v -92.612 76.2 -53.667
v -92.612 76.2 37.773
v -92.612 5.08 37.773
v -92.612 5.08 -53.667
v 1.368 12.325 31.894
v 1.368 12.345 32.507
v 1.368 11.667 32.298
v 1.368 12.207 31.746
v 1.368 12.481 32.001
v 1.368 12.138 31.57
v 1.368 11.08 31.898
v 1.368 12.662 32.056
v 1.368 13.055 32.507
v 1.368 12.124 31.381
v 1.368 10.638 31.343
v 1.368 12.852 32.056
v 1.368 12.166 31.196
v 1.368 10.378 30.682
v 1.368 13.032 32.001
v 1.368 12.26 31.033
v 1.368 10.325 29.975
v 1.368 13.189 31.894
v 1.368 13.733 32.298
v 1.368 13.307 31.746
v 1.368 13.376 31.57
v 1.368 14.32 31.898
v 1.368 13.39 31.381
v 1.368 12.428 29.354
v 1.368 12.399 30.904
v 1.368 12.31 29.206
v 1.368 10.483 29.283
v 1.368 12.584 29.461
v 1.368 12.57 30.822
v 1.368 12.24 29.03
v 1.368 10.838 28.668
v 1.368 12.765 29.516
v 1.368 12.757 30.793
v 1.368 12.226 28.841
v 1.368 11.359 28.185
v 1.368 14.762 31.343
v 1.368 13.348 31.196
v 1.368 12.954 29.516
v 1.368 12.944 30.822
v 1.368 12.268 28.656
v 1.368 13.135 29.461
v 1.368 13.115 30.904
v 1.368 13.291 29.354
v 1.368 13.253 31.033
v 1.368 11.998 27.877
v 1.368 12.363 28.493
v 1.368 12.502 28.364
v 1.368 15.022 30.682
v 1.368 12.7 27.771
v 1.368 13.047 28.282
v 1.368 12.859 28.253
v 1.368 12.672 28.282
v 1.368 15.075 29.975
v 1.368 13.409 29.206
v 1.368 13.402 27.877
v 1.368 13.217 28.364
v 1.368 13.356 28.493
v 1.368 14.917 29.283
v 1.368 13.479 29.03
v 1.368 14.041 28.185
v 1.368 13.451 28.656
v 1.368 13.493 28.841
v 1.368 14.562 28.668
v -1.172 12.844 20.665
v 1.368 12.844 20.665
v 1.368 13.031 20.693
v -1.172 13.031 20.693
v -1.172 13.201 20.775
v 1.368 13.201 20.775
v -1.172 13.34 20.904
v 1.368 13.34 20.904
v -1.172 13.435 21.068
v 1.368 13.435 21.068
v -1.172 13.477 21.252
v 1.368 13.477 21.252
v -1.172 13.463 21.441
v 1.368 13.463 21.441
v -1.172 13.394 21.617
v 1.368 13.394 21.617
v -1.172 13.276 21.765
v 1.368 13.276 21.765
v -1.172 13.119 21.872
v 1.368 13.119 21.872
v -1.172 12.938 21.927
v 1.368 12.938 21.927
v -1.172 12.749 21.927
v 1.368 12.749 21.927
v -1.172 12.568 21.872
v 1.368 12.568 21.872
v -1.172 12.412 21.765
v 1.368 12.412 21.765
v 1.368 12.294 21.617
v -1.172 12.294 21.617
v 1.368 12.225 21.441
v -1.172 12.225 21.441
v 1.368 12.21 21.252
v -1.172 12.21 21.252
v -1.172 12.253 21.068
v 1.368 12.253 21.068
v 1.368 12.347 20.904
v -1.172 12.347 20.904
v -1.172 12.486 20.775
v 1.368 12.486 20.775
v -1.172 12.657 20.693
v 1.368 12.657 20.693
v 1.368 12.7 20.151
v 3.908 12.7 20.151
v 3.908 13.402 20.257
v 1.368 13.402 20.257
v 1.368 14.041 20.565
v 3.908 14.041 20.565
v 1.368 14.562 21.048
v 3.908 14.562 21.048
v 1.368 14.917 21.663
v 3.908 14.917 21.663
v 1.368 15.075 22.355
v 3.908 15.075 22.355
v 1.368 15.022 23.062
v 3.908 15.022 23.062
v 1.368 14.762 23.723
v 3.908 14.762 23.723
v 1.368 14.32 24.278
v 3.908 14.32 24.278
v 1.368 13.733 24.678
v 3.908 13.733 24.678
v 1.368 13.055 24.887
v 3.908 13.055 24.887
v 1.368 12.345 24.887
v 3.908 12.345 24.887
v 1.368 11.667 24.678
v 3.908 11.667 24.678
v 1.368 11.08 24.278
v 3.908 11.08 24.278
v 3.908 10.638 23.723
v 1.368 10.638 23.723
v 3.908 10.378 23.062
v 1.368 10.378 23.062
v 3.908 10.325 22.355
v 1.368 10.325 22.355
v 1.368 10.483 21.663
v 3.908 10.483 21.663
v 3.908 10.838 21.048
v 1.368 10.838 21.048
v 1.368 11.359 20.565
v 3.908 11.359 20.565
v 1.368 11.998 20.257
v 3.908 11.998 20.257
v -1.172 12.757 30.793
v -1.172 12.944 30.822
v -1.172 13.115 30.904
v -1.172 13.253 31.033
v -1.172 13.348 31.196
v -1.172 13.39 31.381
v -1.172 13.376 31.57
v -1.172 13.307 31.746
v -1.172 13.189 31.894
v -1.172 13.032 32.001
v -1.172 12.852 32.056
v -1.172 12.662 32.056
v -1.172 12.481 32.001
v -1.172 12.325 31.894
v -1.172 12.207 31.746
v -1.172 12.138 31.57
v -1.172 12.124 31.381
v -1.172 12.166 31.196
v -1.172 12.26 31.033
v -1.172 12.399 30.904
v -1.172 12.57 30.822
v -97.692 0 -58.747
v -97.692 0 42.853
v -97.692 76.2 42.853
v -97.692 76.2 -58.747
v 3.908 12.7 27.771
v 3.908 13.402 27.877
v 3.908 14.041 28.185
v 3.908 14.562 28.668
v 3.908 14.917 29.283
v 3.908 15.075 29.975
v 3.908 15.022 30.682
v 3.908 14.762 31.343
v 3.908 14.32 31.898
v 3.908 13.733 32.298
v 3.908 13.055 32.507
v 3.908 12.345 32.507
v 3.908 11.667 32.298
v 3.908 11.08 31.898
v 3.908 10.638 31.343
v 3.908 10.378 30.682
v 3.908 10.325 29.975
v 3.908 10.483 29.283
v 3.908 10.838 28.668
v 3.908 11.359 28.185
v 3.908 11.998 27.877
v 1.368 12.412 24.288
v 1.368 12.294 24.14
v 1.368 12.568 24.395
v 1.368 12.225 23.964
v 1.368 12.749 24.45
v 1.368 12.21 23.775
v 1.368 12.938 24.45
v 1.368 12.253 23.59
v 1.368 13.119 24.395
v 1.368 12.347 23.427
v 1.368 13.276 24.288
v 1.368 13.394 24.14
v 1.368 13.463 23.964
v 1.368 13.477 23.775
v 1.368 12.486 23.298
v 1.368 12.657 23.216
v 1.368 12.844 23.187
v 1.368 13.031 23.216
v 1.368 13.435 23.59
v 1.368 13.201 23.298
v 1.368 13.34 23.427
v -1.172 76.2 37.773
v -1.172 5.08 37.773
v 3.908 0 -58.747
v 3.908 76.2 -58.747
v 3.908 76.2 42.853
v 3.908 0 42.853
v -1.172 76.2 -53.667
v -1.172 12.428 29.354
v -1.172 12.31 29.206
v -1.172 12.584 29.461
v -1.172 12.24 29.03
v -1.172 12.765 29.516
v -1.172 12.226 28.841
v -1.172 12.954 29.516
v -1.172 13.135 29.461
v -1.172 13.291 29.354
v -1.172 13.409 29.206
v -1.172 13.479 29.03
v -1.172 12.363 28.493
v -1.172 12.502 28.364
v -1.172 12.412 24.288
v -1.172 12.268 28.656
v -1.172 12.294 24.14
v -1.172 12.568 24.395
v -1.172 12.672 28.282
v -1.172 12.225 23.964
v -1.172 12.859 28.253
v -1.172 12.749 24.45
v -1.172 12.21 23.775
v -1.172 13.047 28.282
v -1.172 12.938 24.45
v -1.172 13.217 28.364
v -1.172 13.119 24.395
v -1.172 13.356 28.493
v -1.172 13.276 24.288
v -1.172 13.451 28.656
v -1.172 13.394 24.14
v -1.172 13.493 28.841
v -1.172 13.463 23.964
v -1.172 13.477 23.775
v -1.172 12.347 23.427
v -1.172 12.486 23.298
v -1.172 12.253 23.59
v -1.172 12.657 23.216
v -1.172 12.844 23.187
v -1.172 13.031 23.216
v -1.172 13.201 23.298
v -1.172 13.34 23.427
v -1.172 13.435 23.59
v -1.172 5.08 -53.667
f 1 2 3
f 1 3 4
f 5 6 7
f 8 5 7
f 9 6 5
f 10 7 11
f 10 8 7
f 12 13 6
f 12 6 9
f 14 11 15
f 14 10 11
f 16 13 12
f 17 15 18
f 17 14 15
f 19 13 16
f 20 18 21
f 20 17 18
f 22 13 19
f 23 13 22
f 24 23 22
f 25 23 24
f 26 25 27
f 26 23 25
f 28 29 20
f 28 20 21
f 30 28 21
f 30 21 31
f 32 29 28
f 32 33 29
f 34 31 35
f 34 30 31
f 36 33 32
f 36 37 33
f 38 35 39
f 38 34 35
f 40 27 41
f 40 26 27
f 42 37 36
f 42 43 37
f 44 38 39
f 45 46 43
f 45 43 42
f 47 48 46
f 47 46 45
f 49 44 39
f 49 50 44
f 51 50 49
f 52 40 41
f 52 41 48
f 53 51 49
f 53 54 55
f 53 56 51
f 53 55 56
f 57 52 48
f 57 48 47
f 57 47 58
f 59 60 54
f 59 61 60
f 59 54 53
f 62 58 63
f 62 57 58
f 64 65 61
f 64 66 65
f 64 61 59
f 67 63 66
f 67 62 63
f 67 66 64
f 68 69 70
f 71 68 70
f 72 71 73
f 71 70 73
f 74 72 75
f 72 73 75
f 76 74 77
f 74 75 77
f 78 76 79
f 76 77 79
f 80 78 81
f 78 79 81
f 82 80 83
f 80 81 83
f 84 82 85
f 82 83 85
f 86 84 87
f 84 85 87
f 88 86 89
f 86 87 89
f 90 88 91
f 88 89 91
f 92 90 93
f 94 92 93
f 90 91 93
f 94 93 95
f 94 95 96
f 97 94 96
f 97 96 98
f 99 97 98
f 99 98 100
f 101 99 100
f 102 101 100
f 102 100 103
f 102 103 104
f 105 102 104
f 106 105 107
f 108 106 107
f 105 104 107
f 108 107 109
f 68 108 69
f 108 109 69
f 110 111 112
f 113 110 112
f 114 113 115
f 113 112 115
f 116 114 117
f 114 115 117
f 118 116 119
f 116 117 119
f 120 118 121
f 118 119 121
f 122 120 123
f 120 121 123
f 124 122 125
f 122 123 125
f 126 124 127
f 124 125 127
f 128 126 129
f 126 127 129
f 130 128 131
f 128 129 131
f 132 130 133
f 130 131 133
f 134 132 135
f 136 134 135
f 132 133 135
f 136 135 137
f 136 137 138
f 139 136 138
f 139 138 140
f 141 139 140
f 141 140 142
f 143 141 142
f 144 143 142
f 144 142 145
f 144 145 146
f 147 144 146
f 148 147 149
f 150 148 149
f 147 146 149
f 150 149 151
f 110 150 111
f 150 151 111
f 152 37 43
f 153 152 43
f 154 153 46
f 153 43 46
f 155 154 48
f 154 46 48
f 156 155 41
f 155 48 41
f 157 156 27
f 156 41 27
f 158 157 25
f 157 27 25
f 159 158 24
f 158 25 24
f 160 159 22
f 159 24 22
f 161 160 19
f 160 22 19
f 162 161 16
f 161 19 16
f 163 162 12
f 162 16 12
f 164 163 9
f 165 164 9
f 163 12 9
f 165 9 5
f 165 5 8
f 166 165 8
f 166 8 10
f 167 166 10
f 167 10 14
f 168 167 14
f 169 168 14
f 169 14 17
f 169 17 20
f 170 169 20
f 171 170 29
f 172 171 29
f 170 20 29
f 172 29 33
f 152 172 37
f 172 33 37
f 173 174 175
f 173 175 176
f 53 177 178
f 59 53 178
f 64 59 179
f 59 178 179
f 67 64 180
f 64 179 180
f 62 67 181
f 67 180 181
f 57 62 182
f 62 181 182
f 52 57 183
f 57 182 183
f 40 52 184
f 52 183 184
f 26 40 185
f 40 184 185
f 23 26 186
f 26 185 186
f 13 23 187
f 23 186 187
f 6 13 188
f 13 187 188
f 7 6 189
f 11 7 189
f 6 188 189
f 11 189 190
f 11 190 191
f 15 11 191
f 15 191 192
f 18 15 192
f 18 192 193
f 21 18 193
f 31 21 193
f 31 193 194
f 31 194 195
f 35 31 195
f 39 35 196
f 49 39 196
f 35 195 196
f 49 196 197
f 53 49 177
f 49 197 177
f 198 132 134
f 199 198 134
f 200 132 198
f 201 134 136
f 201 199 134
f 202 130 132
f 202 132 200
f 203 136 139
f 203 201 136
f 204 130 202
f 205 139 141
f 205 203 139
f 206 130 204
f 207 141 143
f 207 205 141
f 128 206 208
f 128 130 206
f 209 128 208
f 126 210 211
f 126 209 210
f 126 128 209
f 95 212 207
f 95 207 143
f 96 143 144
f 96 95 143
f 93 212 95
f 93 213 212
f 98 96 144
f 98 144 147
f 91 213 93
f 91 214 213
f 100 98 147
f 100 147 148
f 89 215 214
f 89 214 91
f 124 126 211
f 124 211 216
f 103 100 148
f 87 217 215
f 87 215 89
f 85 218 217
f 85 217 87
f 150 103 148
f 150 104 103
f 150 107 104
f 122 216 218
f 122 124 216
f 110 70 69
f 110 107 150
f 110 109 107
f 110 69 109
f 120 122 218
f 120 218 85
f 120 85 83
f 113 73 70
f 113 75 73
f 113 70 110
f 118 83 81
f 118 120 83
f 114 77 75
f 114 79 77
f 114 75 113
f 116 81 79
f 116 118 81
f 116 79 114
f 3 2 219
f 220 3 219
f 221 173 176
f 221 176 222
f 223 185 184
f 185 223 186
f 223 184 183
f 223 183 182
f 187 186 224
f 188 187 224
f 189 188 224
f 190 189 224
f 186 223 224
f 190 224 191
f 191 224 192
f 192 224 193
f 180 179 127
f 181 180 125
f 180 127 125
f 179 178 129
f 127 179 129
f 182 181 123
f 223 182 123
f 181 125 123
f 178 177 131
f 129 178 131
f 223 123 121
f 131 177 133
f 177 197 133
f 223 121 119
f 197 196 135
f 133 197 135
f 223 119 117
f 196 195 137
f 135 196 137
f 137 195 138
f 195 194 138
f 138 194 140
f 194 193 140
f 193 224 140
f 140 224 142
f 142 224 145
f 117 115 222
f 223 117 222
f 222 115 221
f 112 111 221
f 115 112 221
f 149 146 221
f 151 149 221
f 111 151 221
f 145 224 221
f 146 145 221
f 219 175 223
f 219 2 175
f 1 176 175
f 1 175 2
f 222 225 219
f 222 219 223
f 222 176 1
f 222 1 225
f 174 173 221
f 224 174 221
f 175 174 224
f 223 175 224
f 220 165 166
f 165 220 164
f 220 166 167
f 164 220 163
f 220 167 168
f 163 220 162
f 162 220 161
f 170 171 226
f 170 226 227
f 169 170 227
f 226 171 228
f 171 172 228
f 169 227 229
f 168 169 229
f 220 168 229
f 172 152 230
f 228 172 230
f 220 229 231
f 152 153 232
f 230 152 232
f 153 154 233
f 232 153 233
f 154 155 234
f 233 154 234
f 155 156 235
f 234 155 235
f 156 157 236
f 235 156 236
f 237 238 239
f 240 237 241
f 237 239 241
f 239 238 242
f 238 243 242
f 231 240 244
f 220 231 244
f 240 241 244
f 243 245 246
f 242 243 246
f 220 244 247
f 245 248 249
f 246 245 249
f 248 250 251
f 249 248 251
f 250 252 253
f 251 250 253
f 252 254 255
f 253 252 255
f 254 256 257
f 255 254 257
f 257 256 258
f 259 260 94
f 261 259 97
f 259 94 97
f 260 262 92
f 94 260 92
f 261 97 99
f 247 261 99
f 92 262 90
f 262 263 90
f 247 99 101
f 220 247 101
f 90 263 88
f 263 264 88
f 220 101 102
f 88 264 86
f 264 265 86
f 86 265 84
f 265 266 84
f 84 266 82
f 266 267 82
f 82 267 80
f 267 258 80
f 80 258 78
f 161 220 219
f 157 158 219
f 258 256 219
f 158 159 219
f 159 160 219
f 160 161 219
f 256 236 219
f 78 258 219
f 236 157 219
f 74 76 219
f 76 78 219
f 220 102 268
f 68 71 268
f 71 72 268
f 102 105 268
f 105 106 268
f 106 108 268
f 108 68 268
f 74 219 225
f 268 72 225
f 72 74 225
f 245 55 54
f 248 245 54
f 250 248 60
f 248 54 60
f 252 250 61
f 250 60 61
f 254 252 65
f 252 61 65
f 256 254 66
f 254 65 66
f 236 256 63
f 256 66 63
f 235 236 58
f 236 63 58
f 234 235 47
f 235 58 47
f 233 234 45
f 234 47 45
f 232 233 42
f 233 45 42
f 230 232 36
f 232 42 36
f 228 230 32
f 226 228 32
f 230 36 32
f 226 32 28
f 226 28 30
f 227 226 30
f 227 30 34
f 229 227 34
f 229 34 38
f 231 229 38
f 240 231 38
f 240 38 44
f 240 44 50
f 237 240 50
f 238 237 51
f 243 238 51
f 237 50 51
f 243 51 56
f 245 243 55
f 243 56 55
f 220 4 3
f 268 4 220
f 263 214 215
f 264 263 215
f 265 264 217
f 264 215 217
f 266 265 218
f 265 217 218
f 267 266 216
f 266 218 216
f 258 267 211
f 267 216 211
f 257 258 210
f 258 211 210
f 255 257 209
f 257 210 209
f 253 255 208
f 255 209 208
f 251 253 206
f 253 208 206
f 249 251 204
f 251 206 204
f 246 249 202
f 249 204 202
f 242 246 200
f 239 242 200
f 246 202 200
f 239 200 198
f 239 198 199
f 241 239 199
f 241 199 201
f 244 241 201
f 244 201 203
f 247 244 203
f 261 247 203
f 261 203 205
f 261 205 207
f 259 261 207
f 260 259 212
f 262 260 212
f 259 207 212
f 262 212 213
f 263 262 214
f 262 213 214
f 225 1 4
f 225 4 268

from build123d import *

# Parameters (mm, degrees)
SKETCH1_W           = 101.6
SKETCH1_H           = 101.6
BOSS_EXTRUDE1_DEPTH = 76.2
SKETCH2_W           = 91.44
SKETCH2_H           = 91.44
CUT_EXTRUDE1_DEPTH  = 71.12
SKETCH3_R           = 2.38125
CUT_EXTRUDE2_DEPTH  = 2.54
SKETCH4_R           = 0.635
CUT_EXTRUDE3_DEPTH  = 2.54
SKETCH6_R           = 2.38125
CUT_EXTRUDE5_DEPTH  = 2.54
SKETCH8_R           = 0.635
CUT_EXTRUDE7_DEPTH  = 2.54


with BuildPart() as part:
    # Sketch1 → Boss-Extrude1 (new body)
    with BuildSketch(Plane(origin=(0, 0, 0), x_dir=(1, 0, 0), z_dir=(0, 1, 0))):
        with Locations((-46.892307692, 7.947401247)):
            Rectangle(SKETCH1_W, SKETCH1_H)
    extrude(amount=BOSS_EXTRUDE1_DEPTH)

    # Sketch2 → Cut-Extrude1 (cut)
    with BuildSketch(Plane(origin=(0, 76.2, 0), x_dir=(1, 0, 0), z_dir=(0, 1, 0))):
        with Locations((-46.892307692, 7.947401247)):
            Rectangle(SKETCH2_W, SKETCH2_H)
    extrude(amount=-CUT_EXTRUDE1_DEPTH, mode=Mode.SUBTRACT)

    # Sketch3 → Cut-Extrude2 (cut)
    with BuildSketch(Plane(origin=(3.907692308, 0, 0), x_dir=(0, 0, -1), z_dir=(1, 0, 0))):
        with Locations((-30.152598753, 12.7)):
            Circle(SKETCH3_R)
    extrude(amount=-CUT_EXTRUDE2_DEPTH, mode=Mode.SUBTRACT)

    # Sketch4 → Cut-Extrude3 (cut)
    with BuildSketch(Plane(origin=(1.367692308, 0, 0), x_dir=(0, 0, -1), z_dir=(1, 0, 0))):
        with Locations((-31.42844237, 12.756924018)):
            Circle(SKETCH4_R)
        with Locations((-28.88844237, 12.859462566)):
            Circle(SKETCH4_R)
    extrude(amount=-CUT_EXTRUDE3_DEPTH, mode=Mode.SUBTRACT)

    # Sketch6 → Cut-Extrude5 (cut)
    with BuildSketch(Plane(origin=(3.907692308, 0, 0), x_dir=(0, 0, -1), z_dir=(1, 0, 0))):
        with Locations((-22.532598753, 12.7)):
            Circle(SKETCH6_R)
    extrude(amount=-CUT_EXTRUDE5_DEPTH, mode=Mode.SUBTRACT)

    # Sketch8 → Cut-Extrude7 (cut)
    with BuildSketch(Plane(origin=(1.367692308, 0, 0), x_dir=(0, 0, -1), z_dir=(1, 0, 0))):
        with Locations((-23.822454546, 12.843688335)):
            Circle(SKETCH8_R)
        with Locations((-21.299543609, 12.843688335)):
            Circle(SKETCH8_R)
    extrude(amount=-CUT_EXTRUDE7_DEPTH, mode=Mode.SUBTRACT)


solid = part.part
